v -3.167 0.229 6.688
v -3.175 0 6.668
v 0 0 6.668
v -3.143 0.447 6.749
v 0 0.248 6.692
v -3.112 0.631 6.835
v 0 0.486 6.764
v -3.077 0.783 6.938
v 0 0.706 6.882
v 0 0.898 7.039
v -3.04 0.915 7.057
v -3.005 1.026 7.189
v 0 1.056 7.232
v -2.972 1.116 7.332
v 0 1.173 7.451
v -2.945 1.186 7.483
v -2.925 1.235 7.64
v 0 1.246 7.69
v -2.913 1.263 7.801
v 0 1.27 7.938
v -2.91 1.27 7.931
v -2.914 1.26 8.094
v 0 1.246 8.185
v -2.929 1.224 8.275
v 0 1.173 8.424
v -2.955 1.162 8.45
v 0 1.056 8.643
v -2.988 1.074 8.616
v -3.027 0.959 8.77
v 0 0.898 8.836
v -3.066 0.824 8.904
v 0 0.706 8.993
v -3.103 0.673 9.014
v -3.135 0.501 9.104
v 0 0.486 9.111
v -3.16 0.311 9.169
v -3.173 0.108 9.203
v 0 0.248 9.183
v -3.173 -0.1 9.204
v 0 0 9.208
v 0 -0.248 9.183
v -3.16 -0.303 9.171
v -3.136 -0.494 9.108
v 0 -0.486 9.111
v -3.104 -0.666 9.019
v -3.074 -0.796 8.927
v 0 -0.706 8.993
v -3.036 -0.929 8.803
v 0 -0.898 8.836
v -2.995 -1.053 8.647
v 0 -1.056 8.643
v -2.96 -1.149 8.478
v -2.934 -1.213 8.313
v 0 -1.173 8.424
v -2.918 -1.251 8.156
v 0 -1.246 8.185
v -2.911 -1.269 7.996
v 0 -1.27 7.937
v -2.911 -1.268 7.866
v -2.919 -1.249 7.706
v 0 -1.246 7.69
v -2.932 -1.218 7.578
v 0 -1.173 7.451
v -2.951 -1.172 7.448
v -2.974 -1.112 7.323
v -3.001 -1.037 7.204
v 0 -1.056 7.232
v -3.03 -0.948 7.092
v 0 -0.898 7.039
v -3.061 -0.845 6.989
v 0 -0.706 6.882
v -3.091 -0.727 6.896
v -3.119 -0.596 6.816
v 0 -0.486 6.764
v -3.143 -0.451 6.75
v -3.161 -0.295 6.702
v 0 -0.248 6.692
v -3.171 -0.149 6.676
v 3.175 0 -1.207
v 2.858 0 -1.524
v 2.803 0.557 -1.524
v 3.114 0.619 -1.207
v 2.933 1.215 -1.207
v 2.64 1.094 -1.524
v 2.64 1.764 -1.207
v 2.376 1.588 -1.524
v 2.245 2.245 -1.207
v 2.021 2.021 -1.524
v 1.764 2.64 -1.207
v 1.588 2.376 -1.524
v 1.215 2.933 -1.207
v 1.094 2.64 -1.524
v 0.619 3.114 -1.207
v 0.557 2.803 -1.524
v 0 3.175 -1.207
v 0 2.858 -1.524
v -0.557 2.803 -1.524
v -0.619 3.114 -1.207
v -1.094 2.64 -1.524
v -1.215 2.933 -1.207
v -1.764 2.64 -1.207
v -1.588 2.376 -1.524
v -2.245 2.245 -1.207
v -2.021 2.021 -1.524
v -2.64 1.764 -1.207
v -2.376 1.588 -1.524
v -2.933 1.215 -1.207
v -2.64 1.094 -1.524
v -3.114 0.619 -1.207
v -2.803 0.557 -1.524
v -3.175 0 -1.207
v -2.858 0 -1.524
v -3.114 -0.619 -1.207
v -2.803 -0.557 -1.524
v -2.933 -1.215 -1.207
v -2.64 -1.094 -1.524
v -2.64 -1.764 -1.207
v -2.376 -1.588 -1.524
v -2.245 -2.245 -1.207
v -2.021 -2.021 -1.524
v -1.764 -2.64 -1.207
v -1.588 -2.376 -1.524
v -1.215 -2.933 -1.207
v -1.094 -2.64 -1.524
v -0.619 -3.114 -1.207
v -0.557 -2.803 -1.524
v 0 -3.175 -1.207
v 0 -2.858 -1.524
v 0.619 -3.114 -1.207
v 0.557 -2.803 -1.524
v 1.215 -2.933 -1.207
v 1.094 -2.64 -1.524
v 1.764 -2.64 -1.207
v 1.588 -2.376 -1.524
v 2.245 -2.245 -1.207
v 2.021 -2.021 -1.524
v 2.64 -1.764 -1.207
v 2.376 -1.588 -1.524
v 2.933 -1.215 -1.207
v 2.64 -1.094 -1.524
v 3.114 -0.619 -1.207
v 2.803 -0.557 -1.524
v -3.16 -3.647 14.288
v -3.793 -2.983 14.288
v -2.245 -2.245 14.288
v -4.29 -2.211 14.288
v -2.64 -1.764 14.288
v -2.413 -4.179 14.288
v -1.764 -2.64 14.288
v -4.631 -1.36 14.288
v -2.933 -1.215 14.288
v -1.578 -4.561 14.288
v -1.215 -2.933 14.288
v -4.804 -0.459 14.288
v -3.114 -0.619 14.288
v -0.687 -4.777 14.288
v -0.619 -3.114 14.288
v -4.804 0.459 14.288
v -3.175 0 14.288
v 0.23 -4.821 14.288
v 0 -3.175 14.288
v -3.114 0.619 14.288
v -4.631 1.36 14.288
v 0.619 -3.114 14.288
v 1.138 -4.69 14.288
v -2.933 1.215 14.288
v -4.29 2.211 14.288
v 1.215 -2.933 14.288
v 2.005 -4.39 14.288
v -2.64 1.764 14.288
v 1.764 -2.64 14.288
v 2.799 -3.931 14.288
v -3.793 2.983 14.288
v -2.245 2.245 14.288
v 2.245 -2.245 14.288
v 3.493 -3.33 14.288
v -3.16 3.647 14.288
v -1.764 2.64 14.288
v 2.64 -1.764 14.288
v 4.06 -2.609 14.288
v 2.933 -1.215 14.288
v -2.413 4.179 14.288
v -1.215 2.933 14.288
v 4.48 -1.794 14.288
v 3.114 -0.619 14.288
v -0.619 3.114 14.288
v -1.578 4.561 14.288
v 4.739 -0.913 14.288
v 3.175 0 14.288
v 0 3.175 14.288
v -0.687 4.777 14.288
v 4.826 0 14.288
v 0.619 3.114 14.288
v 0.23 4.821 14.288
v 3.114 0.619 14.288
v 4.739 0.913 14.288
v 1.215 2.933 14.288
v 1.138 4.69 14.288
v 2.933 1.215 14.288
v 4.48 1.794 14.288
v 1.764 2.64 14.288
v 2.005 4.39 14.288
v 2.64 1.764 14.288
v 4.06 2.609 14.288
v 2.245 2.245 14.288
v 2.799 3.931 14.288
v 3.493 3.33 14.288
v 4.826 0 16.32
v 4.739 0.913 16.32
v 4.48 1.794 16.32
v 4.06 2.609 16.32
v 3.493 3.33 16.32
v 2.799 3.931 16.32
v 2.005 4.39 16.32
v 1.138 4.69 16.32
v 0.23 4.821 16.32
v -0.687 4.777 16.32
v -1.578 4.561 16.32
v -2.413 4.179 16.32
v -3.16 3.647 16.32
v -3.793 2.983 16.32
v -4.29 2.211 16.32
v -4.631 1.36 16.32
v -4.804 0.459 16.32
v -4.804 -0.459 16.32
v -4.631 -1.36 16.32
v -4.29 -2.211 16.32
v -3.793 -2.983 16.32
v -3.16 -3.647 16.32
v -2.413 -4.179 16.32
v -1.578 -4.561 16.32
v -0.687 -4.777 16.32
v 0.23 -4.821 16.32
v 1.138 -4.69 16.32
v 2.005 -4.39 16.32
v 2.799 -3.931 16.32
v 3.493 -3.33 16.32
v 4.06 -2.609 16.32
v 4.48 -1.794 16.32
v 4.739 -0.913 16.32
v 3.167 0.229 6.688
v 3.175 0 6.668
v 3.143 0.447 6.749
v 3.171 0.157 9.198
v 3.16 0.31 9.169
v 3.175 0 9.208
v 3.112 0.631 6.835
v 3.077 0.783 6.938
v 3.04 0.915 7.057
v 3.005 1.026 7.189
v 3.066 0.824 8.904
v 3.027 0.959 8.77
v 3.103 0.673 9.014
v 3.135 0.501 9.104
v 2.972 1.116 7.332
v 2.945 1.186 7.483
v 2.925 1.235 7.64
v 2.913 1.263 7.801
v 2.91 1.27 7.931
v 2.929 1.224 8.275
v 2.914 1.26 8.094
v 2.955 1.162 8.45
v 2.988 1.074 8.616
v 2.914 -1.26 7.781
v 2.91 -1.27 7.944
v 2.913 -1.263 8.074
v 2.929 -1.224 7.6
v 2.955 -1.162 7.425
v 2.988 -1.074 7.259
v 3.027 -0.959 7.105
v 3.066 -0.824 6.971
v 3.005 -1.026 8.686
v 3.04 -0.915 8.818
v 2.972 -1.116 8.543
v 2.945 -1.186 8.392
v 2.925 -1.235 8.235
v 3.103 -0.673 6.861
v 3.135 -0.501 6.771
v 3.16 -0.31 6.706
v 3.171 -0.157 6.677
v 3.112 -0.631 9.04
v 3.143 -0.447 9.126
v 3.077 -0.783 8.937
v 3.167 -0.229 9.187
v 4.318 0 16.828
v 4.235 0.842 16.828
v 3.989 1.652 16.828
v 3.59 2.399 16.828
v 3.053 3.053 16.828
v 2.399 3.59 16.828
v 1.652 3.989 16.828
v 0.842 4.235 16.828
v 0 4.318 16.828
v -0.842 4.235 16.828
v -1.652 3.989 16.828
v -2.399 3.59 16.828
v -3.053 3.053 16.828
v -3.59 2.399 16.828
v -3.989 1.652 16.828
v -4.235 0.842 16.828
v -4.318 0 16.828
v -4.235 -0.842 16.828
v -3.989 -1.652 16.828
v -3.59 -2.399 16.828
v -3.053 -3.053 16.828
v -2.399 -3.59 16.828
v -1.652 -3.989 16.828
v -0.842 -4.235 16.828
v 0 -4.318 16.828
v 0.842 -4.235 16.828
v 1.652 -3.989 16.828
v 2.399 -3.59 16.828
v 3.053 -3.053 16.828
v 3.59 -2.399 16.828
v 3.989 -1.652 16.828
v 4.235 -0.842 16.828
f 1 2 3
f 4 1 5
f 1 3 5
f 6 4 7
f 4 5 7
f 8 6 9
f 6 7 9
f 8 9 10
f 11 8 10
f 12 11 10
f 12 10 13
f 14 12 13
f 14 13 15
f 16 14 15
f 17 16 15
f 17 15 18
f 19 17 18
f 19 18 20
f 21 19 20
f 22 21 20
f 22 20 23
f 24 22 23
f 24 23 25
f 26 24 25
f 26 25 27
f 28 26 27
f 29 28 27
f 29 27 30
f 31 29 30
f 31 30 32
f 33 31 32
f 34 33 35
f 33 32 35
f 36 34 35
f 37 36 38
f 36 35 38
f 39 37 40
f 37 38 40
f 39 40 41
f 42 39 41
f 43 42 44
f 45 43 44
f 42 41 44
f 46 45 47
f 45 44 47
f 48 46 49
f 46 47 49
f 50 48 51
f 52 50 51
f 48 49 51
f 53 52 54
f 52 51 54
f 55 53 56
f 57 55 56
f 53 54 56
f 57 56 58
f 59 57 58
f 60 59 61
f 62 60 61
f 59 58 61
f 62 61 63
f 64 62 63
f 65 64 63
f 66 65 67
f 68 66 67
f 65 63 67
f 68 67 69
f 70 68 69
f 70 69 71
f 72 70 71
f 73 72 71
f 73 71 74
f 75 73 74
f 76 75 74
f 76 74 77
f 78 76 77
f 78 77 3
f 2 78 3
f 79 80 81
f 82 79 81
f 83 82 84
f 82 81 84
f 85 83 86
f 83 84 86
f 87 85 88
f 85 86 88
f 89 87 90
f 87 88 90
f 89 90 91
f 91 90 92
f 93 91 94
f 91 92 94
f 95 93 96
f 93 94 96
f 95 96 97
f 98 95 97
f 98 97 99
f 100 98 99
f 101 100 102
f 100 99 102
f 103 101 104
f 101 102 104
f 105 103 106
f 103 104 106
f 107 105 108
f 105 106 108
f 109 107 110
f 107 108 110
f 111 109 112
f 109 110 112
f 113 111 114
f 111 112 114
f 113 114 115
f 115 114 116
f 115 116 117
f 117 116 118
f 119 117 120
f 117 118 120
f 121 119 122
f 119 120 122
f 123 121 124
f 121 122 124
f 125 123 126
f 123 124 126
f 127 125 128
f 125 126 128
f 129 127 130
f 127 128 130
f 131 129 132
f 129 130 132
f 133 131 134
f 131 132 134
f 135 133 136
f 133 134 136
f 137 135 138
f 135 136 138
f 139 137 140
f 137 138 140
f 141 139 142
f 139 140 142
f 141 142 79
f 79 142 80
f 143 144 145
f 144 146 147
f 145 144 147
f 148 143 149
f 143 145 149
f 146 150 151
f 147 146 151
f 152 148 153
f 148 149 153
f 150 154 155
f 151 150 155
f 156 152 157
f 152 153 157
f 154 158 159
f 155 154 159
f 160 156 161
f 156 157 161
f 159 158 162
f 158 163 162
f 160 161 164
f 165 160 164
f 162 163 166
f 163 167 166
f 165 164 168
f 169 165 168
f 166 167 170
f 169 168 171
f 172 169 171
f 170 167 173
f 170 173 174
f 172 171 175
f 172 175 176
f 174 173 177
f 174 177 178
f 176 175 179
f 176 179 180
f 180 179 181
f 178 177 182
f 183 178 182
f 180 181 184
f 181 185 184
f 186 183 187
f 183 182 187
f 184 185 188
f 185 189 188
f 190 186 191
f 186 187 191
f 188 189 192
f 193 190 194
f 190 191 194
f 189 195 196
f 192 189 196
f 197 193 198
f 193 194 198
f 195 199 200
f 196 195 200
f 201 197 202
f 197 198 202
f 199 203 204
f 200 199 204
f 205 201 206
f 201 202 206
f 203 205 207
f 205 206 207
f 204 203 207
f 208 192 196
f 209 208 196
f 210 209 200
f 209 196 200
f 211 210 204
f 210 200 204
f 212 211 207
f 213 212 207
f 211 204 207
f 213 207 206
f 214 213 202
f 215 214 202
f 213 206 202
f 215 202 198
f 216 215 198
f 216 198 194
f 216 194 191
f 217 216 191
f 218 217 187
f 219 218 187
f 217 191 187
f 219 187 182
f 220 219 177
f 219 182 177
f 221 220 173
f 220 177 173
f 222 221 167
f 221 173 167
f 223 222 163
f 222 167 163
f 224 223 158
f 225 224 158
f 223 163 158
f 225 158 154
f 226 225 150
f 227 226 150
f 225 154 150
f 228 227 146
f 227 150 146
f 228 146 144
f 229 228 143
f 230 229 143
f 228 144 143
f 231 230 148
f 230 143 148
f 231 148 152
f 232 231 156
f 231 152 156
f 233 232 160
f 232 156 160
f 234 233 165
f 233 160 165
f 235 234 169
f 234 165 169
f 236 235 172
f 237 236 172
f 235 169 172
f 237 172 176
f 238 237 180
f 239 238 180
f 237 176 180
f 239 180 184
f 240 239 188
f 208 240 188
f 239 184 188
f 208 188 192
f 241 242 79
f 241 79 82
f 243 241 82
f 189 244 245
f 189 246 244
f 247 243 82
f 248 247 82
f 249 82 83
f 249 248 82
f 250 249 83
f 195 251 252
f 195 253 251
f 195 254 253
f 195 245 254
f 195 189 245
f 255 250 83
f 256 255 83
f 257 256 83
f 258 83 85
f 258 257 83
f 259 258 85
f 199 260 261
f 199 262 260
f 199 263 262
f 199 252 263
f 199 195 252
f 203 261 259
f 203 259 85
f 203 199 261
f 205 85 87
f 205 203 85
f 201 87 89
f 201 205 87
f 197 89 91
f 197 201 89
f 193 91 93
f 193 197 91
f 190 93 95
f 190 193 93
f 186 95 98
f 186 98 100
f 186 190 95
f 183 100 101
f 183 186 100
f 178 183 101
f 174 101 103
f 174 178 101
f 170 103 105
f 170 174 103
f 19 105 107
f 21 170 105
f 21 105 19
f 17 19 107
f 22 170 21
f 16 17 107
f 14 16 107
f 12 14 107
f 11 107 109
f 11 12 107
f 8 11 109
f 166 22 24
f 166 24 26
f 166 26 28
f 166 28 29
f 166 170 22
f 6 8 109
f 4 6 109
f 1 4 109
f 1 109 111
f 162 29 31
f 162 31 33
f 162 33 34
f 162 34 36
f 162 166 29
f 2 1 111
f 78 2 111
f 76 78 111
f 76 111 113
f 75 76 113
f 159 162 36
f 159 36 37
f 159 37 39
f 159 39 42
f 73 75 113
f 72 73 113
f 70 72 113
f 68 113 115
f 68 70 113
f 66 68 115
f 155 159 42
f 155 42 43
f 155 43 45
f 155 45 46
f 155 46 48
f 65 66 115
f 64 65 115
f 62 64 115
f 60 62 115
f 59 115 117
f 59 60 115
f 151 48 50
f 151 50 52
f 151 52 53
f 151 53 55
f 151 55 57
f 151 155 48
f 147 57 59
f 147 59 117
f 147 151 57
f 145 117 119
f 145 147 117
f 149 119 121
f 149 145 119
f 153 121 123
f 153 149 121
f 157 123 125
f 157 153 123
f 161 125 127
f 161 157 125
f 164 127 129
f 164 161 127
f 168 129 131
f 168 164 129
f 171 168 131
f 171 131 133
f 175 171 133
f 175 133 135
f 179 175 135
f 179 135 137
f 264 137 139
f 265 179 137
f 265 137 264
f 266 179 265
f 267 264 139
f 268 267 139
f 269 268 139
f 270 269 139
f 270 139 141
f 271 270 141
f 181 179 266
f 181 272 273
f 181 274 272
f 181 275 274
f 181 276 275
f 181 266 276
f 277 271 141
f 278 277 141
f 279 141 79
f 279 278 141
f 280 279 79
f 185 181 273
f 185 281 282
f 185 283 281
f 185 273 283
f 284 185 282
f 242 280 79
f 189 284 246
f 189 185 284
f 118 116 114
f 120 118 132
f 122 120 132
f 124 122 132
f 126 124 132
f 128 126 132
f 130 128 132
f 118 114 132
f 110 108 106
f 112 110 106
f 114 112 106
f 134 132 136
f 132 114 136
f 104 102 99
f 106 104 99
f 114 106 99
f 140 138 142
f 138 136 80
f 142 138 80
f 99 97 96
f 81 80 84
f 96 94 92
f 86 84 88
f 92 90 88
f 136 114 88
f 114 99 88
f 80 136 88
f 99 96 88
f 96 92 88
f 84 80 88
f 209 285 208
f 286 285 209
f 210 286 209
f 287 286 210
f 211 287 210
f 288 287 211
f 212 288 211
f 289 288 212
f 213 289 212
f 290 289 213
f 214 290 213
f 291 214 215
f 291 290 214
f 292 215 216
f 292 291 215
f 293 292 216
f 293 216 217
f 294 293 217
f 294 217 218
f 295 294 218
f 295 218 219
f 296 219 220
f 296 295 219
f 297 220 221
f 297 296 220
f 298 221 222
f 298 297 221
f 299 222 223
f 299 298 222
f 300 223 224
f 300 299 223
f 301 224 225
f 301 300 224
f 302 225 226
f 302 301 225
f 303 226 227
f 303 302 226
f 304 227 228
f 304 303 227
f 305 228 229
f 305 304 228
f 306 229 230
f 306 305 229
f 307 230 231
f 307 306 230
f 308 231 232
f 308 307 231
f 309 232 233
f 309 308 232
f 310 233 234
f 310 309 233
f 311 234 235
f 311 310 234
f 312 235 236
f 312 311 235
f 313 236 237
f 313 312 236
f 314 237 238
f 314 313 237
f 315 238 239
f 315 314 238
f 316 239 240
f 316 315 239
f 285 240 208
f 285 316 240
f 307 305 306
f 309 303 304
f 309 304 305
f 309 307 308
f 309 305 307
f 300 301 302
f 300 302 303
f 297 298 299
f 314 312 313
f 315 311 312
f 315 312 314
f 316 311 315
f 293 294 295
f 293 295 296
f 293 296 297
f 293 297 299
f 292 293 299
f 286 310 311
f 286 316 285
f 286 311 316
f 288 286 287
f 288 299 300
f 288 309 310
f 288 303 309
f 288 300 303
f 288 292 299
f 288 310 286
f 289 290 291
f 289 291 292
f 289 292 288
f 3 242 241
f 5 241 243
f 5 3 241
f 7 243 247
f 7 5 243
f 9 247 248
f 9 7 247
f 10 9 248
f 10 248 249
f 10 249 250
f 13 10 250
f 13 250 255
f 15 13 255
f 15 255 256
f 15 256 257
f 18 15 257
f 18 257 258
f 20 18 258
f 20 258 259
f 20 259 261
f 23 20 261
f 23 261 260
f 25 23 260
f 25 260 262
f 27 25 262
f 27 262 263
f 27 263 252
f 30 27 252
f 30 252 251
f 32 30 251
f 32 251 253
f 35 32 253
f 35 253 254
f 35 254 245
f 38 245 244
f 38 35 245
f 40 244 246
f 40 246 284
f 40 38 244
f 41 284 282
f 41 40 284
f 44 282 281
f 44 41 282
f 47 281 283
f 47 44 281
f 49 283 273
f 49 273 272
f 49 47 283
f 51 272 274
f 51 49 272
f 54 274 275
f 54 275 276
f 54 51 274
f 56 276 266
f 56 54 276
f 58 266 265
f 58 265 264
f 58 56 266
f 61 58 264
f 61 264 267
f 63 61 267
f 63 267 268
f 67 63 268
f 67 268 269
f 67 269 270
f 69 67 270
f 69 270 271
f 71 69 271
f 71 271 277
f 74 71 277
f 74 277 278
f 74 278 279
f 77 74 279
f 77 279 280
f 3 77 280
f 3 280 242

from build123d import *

# Parameters (mm, degrees)
EXTRUDE1_DEPTH          = 14.2875
EXTRUDE1_DEPTH_BACK     = 1.524
SKETCH1_R               = 3.175
SKETCH2_R               = 4.826
EXTRUDE2_DEPTH          = 2.54
CHAMFER1_SIZE           = 0.508
CHAMFER2_SIZE           = 0.3175
CUT_EXTRUDE1_DEPTH      = 3.175
CUT_EXTRUDE1_DEPTH_BACK = 3.175
SKETCH9_R               = 1.27


with BuildPart() as part:
    # Sketch1 → Extrude1 (new, two sides: drawn at the far end of the back side and taken through both)
    with BuildSketch(Plane.XY.offset(-EXTRUDE1_DEPTH_BACK)):
        Circle(SKETCH1_R)
    extrude(amount=EXTRUDE1_DEPTH + EXTRUDE1_DEPTH_BACK)

    # Sketch2 → Extrude2 (add)
    with BuildSketch(Plane.XY.offset(14.2875)):
        Circle(SKETCH2_R)
    extrude(amount=EXTRUDE2_DEPTH)

    # Chamfer1
    chamfer1_edges = [part.edges().sort_by_distance(p)[0] for p in [
        (-4.826, 0, 16.8275),
    ]]
    chamfer(chamfer1_edges, length=CHAMFER1_SIZE)

    # Chamfer2
    chamfer2_edges = [part.edges().sort_by_distance(p)[0] for p in [
        (-3.175, 0, -1.524),
    ]]
    chamfer(chamfer2_edges, length=CHAMFER2_SIZE)

    # Sketch9 → Cut-Extrude1 (cut, two sides: drawn at the far end of the back side and taken through both)
    with BuildSketch(Plane(origin=(0, 0, 0), x_dir=(0, 0, -1), z_dir=(1, 0, 0)).offset(-CUT_EXTRUDE1_DEPTH_BACK)):
        with Locations((-7.9375, 0)):
            Circle(SKETCH9_R)
    extrude(amount=CUT_EXTRUDE1_DEPTH + CUT_EXTRUDE1_DEPTH_BACK, mode=Mode.SUBTRACT)


solid = part.part
